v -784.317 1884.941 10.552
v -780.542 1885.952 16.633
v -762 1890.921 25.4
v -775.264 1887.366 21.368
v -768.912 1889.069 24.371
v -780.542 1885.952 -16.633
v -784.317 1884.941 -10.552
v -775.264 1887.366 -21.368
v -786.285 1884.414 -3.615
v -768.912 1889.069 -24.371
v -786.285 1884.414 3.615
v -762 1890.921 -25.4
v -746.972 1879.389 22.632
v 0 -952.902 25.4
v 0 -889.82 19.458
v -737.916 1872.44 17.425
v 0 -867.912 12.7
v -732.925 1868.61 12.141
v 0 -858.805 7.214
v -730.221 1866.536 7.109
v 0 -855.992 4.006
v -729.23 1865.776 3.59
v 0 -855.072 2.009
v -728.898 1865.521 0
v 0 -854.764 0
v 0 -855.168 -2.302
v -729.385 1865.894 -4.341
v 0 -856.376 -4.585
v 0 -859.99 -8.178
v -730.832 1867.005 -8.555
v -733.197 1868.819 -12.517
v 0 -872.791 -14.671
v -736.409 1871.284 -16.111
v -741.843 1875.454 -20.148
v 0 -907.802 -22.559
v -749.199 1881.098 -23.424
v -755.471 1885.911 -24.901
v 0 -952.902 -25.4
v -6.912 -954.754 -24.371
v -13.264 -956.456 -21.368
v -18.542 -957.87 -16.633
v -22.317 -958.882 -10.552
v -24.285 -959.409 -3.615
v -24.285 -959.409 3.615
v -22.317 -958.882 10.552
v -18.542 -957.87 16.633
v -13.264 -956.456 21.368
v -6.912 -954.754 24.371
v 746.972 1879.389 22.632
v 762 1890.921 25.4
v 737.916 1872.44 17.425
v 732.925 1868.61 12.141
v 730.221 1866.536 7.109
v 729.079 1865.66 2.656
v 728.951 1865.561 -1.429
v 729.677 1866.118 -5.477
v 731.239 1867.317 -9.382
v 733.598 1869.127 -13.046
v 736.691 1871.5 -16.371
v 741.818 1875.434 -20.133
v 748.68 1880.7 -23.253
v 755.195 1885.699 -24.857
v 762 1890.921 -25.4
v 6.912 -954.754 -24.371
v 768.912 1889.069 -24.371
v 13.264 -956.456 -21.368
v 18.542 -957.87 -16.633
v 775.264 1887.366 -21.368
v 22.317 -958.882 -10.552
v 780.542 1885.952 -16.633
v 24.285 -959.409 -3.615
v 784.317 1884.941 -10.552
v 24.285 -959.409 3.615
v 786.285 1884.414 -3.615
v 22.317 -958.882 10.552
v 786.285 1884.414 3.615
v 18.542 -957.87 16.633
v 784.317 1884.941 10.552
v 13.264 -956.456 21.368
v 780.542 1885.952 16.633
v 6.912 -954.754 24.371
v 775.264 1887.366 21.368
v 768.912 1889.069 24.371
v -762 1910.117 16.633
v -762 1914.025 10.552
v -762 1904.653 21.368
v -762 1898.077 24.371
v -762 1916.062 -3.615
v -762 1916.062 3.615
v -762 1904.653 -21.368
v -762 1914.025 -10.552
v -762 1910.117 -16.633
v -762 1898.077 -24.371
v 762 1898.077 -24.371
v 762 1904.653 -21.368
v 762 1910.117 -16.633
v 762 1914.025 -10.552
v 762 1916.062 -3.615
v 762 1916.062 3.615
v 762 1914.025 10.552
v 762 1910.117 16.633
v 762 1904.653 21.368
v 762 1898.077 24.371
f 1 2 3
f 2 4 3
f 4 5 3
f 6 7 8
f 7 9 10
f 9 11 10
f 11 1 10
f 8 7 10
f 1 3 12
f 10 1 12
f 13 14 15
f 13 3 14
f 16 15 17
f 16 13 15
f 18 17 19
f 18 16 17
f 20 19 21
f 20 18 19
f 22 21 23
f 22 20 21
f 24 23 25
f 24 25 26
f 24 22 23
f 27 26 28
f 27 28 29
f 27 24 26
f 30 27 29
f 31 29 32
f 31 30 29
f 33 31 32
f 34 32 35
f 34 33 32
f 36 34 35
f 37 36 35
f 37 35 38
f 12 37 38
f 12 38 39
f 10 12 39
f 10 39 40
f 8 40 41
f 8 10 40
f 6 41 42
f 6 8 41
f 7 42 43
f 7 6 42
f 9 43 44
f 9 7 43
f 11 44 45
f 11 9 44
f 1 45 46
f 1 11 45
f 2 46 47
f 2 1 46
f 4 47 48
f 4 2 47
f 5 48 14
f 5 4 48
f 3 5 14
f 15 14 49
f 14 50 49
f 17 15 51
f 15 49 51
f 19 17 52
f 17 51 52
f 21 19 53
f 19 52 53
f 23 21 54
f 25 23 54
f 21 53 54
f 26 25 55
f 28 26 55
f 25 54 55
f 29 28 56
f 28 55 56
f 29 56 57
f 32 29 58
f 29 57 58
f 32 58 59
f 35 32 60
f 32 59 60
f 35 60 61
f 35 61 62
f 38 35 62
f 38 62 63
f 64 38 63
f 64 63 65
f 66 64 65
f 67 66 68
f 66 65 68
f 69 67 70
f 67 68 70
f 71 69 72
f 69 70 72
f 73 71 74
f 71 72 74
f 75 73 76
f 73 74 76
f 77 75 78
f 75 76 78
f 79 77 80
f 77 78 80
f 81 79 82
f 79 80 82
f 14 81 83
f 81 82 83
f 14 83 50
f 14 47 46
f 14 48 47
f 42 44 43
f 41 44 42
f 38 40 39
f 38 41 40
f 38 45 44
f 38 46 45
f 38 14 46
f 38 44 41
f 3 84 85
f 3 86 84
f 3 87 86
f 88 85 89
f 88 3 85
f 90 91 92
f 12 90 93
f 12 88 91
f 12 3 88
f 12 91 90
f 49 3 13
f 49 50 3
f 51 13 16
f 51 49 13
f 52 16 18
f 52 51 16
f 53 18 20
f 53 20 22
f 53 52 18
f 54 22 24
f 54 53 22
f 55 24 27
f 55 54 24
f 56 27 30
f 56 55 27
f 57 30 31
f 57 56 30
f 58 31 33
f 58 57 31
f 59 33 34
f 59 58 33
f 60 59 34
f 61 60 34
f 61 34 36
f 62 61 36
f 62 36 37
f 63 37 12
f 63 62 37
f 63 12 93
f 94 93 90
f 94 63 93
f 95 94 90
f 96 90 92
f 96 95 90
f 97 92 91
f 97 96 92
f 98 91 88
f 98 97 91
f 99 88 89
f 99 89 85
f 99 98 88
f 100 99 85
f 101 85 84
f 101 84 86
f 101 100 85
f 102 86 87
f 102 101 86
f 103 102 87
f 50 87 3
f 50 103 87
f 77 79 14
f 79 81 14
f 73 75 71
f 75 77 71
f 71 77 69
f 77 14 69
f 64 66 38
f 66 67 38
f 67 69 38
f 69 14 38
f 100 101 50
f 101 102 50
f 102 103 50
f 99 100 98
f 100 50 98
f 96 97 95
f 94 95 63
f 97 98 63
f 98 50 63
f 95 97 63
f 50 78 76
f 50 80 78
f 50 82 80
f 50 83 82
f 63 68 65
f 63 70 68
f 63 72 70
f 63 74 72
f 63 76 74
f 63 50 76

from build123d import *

# Parameters (mm, degrees)
F4_E2_W = 1524
F4_E2_H = 25.4
F3_E1_W = 2944.1419185291
F3_E1_H = 25.4


# Not quite as in the source:
# - a feature of the source that left no trace in its solid (it failed there, or was rolled back) is left out
# - a pattern or mirror of a feature is missing from the dataset's text; its kind, count and spacing are read off the source's solid


with BuildPart() as f5:
    # F4_E2 (on explicit) → F5 (revolve)
    with BuildSketch(Plane(origin=(-762, 1890.9206461344, 0), x_dir=(1, 0, 0), z_dir=(0, -1, 0))):
        with Locations((762, 12.7)):
            Rectangle(F4_E2_W, F4_E2_H)
    revolve(axis=Axis((0, 1890.9206461344, 0), (1, 0, 0)))

    # F3_E1 (on explicit) → F6 (revolve)
    with BuildSketch(Plane(origin=(0, -952.9020692331, 0), x_dir=(-0.2588190451, 0.9659258263, 0), z_dir=(0.9659258263, 0.2588190451, 0))):
        with Locations((1472.0709592645, 12.7)):
            Rectangle(F3_E1_W, F3_E1_H)
    f6 = revolve(axis=Axis((-381, 469.0092884507, 0), (-0.2588190451, 0.9659258263, 0)))

    # F6_copies: F6 across plane
    add(f6.mirror(Plane(origin=(0, 0, 0), x_dir=(0, 0, 1), z_dir=(1, 0, 0))))


solid = f5.part
